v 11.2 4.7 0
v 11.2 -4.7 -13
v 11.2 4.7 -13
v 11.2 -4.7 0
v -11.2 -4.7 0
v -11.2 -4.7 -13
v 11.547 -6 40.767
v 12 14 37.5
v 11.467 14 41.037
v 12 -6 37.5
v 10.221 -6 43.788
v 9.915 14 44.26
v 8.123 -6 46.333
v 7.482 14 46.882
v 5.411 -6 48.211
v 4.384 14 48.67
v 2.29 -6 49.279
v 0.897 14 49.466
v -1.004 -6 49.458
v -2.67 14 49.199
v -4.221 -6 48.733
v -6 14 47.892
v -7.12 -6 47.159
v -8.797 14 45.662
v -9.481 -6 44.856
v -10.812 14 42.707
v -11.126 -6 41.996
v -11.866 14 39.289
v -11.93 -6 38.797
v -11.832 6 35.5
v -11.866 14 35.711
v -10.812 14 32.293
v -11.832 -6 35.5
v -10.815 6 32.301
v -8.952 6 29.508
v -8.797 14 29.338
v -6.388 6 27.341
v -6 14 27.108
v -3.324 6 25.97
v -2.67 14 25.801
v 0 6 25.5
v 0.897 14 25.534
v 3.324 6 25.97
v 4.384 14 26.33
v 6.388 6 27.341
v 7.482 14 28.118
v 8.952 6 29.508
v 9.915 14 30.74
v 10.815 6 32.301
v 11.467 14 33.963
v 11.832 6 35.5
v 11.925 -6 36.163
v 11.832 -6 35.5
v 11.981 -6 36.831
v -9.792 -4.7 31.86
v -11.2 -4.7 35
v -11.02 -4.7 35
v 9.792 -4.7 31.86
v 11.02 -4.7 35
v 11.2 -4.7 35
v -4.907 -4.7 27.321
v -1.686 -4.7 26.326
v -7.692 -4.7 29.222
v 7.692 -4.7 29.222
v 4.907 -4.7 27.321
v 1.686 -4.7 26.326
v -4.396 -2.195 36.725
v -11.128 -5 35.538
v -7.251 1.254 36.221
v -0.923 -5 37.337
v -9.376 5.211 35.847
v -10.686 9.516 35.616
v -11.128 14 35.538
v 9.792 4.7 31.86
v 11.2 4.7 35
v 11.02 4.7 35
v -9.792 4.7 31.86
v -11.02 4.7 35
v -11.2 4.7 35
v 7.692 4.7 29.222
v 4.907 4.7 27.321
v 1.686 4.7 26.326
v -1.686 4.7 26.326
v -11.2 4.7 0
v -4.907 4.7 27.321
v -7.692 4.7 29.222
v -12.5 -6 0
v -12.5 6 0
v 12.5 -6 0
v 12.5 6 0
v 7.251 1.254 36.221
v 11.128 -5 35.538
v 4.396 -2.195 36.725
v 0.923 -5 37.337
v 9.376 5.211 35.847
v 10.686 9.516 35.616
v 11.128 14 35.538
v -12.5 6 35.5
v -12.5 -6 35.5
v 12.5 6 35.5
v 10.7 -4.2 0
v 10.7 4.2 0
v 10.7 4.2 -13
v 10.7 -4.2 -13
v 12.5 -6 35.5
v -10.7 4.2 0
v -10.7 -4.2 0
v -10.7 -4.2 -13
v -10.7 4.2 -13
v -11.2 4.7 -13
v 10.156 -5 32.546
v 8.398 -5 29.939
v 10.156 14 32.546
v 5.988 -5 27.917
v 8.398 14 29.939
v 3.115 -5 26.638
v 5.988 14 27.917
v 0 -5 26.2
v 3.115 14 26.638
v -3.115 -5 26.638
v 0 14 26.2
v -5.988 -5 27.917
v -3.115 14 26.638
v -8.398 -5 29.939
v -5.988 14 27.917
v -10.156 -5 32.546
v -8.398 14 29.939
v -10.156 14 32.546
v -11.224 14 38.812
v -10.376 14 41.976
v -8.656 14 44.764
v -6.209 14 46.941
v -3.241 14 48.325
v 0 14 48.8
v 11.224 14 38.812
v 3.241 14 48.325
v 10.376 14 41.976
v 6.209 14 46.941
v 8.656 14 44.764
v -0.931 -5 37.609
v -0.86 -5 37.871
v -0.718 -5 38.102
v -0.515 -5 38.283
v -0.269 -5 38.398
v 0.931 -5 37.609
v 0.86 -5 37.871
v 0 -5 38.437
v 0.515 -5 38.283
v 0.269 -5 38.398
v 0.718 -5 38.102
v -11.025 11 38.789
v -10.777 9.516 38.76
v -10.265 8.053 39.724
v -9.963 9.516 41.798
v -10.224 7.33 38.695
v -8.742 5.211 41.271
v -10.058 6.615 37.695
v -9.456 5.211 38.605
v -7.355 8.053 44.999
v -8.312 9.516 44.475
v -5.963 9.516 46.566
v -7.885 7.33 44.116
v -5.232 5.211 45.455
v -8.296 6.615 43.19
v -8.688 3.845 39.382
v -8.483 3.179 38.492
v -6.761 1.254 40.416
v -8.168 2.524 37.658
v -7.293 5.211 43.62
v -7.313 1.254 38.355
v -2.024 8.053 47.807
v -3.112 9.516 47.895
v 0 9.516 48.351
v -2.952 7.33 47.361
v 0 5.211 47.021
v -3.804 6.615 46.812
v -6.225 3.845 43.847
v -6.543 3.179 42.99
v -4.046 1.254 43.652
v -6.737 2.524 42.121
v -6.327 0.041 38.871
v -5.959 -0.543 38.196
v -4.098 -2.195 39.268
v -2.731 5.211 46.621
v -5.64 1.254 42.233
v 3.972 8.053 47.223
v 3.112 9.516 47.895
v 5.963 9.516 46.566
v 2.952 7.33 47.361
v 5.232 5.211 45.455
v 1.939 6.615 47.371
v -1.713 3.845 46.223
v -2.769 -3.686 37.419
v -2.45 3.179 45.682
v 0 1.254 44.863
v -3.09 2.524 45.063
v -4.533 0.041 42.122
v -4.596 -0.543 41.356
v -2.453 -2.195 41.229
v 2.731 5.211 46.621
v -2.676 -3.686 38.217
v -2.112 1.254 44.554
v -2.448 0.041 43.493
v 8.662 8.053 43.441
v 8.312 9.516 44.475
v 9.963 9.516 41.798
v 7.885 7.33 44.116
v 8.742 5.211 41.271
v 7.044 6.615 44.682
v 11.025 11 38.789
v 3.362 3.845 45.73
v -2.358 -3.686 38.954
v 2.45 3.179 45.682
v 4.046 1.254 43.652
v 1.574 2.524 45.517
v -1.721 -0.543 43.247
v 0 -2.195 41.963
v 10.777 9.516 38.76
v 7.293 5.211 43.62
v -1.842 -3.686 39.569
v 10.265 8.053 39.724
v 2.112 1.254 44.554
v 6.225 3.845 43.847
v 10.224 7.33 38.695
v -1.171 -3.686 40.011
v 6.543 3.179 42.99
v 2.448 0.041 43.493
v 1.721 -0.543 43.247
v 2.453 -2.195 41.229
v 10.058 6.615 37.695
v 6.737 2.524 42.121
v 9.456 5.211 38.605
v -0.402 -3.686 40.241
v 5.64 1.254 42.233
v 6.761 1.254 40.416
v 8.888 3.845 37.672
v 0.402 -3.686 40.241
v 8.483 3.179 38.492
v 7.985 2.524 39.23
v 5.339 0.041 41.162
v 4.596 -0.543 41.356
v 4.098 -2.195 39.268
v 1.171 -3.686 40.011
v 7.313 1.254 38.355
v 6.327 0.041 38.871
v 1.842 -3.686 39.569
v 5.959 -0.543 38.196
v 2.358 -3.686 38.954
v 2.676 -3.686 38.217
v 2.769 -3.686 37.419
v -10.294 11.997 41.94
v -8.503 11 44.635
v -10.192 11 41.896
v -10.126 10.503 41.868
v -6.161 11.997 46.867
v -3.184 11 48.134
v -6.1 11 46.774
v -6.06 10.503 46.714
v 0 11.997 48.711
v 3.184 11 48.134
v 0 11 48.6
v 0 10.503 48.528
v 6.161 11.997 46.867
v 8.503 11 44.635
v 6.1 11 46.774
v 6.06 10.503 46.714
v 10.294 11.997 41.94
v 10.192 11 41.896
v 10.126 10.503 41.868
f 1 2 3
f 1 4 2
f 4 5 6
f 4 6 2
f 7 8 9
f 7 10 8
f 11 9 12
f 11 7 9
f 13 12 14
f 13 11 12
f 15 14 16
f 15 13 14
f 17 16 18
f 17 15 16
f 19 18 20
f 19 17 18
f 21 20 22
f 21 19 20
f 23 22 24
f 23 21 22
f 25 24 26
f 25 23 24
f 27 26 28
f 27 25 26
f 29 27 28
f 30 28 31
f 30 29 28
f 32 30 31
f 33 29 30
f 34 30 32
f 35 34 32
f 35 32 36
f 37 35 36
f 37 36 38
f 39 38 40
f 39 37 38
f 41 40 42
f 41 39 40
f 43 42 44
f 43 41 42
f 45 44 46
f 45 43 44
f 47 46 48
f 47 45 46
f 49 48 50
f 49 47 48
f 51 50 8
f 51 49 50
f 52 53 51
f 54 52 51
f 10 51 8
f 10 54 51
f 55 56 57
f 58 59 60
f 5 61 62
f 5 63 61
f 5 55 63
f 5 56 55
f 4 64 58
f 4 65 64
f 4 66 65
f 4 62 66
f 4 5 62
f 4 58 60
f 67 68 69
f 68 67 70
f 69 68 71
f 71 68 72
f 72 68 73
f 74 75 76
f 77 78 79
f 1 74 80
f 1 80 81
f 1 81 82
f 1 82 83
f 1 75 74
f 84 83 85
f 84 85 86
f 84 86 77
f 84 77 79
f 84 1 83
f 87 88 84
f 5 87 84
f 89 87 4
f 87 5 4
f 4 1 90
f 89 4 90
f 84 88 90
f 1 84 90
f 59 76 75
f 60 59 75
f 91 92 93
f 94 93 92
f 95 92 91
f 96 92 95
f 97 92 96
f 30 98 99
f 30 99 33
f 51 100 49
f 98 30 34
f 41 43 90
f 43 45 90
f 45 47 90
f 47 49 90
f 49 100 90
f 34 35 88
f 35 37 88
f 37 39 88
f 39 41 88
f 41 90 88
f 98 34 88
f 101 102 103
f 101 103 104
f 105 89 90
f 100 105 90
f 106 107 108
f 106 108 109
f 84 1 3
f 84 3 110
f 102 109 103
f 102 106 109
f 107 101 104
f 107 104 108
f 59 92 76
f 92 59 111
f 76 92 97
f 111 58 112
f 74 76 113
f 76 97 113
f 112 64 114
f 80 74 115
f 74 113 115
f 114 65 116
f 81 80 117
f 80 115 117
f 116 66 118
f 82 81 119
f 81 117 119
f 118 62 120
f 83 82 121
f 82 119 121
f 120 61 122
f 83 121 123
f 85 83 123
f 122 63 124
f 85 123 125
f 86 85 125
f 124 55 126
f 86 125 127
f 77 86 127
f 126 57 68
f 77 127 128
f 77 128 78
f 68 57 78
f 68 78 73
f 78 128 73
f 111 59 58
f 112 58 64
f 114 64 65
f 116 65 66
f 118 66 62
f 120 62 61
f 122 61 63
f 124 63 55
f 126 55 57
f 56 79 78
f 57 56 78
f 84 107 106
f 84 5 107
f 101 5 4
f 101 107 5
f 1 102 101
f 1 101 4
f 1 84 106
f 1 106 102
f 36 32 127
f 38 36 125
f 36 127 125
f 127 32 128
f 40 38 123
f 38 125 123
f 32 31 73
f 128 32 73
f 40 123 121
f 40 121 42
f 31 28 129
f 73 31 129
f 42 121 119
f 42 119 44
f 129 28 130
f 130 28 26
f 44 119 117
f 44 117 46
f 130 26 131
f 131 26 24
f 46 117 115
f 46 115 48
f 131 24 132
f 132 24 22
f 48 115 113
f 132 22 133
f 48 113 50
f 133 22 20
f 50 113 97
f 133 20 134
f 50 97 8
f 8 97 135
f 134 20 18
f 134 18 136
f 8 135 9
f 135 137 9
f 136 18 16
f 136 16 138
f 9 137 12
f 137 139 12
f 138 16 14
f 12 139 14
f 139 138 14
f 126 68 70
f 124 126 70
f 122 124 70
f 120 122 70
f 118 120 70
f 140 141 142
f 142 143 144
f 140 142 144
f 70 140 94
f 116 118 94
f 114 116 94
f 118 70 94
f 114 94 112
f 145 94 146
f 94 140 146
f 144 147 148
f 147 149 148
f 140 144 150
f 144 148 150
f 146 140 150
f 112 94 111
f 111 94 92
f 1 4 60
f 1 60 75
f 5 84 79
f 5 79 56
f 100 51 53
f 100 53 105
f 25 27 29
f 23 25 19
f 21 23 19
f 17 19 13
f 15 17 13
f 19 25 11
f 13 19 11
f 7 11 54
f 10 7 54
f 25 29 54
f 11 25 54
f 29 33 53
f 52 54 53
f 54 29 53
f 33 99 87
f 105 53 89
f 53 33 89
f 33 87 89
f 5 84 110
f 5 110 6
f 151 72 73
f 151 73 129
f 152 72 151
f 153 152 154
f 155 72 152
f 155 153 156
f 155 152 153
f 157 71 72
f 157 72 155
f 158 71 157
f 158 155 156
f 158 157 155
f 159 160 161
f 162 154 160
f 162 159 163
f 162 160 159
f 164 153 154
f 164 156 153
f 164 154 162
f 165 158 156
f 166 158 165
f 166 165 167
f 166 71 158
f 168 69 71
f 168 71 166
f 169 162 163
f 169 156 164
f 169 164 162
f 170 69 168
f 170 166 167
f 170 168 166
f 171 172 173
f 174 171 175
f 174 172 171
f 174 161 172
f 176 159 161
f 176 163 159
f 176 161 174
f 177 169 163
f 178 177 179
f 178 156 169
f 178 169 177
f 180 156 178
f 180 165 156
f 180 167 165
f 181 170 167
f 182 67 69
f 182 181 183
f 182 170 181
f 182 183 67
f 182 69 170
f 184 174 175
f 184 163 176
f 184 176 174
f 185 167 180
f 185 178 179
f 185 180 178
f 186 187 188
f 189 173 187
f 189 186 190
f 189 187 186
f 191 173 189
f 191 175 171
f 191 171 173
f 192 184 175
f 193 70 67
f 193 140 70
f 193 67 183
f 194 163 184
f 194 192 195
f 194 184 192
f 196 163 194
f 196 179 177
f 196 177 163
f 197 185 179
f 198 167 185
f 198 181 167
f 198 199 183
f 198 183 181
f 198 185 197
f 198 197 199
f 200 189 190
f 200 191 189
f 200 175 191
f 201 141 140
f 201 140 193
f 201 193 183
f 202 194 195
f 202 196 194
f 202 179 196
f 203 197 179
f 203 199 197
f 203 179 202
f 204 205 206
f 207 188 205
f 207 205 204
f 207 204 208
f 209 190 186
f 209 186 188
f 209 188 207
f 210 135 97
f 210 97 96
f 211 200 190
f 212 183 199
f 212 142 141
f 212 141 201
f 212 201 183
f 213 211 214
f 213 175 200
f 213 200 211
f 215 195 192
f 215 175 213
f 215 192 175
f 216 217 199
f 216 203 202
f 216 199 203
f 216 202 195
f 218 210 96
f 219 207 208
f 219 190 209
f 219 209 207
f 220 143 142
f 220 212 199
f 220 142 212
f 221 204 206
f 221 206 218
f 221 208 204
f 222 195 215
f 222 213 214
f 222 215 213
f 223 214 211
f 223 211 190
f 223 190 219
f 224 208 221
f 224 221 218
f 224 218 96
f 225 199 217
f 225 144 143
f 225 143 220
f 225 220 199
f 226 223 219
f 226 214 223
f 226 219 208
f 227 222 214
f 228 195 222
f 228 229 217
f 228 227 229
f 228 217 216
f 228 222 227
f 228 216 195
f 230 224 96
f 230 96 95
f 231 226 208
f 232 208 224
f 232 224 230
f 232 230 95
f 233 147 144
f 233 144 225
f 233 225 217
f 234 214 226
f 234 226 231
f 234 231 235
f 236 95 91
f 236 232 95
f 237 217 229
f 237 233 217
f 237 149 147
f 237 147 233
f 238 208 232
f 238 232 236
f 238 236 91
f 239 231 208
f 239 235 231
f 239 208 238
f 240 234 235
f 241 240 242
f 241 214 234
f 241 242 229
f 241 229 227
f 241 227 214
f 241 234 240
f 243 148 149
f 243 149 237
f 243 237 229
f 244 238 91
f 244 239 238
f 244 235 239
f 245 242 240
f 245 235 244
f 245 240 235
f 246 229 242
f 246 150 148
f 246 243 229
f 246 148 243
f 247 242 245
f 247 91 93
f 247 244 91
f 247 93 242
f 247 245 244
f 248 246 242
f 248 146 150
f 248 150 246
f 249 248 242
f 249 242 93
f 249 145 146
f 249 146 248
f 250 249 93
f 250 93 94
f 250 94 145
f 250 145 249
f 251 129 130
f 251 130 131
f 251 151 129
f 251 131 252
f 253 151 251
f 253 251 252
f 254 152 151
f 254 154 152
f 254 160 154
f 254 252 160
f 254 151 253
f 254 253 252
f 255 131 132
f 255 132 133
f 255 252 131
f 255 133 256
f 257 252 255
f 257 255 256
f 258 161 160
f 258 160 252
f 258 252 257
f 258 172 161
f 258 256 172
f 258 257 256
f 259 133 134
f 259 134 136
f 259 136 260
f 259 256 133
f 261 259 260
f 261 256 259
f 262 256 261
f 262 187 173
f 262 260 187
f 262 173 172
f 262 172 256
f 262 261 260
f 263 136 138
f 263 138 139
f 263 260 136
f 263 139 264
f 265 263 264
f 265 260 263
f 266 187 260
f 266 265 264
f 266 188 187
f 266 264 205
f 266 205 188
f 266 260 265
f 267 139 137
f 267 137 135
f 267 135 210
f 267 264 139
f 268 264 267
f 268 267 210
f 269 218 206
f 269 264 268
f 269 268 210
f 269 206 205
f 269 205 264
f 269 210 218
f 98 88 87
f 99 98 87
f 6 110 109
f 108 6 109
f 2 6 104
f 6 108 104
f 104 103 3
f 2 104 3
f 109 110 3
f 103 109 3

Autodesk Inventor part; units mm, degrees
ref_plane "YZ Plane" through (0, 0, 0) normal (1, 0, 0) x (0, 1, 0)
ref_plane "XZ Plane" through (0, 0, 0) normal (0, 1, 0) x (-1, 0, 0)
ref_plane "XY Plane" through (0, 0, 0) normal (0, 0, 1) x (1, 0, 0)
sketch "스케치1" plane through (0, 0, 0) normal (0, 0, 1) x (1, 0, 0)
  line L0 (-11.2, -4.7) -> (11.2, -4.7)
  line L1 (11.2, -4.7) -> (11.2, 4.7)
  line L2 (11.2, 4.7) -> (-11.2, 4.7)
  line L3 (-11.2, 4.7) -> (-11.2, -4.7)
  line L4 (-11.2, -4.7) -> (11.2, 4.7) construction
  line L5 (11.2, -4.7) -> (-11.2, 4.7) construction
  line L6 (-12.5, -6) -> (12.5, -6)
  line L7 (12.5, -6) -> (12.5, 6)
  line L8 (12.5, 6) -> (-12.5, 6)
  line L9 (-12.5, 6) -> (-12.5, -6)
  line L10 (-12.5, -6) -> (12.5, 6) construction
  line L11 (12.5, -6) -> (-12.5, 6) construction
  line L12 (-10.7, 4.2) -> (10.7, 4.2)
  line L13 (10.7, 4.2) -> (10.7, -4.2)
  line L14 (10.7, -4.2) -> (-10.7, -4.2)
  line L15 (-10.7, -4.2) -> (-10.7, 4.2)
  point P0 (0, 0)
  dimension "d0" = 22.4
  dimension "d1" = 9.4
  dimension "d2" = 25
  dimension "d3" = 12
  dimension "d6" = 0.5
extrude "돌출1" add sketch "스케치1" along normal blind 25.5 contours L9 L8 L7 L6
extrude "돌출2" add sketch "스케치1" against normal blind 13 contours L3 L2 L1 L0
sketch "스케치2" plane through (-12.5, -6, 0) normal (0, -1, 0) x (1, 0, 0)
  line L0 (0, 0) -> (25, 0) projected
  line L1 (0, 25.5) -> (25, 25.5) projected
  circle A0 centre (12.5, 37.5) radius 12
  circle A1 centre (12.5, 37.5) radius 11.3
  point P0 (12.5, 0)
  point P1 (12.5, 0)
  dimension "d9" = 24
  dimension "d11" = 0.7
extrude "돌출3" add sketch "스케치2" against normal blind 20 contours A0 | A1
sketch "스케치3" plane through (0, 0, 25.5) normal (0, 0, 1) x (1, 0, 0)
  line L0 (0, -6) -> (12.5, -6) projected
  line L1 (12.5, -6) -> (12.5, 6) projected
  line L2 (12.5, 6) -> (0, 6) projected
  line L3 (0, 4.7) -> (11.2, 4.7) projected
  line L4 (11.2, 4.7) -> (11.2, -4.7) projected
  line L5 (11.2, -4.7) -> (0, -4.7) projected
  line L6 (0, -6) -> (0, -4.7) projected
  line L7 (0, -4.7) -> (-11.2, -4.7) projected
  line L8 (-11.2, -4.7) -> (-11.2, 4.7) projected
  line L9 (-11.2, 4.7) -> (0, 4.7) projected
  line L10 (0, 4.7) -> (0, 6) projected
  line L11 (0, 6) -> (-12.5, 6) projected
  line L12 (-12.5, 6) -> (-12.5, -6) projected
  line L13 (-12.5, -6) -> (0, -6) projected
  line L14 (0, -6) -> (12.5, -6) projected
  line L15 (12.5, -6) -> (12.5, 6) projected
  line L16 (12.5, 6) -> (0, 6) projected
  line L17 (0, 4.7) -> (11.2, 4.7) projected
  line L18 (11.2, 4.7) -> (11.2, -4.7) projected
  line L19 (11.2, -4.7) -> (0, -4.7) projected
  point P0 (0, 0)
extrude "돌출4" add sketch "스케치3" along normal blind 10 contours L6 L5 L4 L3 L10 L2 L1 L0 | L13 L12 L11 L10 L9 L8 L7 L6
extrude "돌출5" cut sketch "스케치2" along normal blind 19 from surface at -20 contours A1
extrude "돌출6" cut sketch "스케치1" along normal blind 35 contours L3 L2 L1 L0 | L12 L13 L14 L15
ref_plane "작업 평면1" through (0, -6, 0) normal (1, 0, 0) x (0, 0, -1)
sketch "스케치4" plane through (0, -6, 0) normal (1, 0, 0) x (0, 0, -1)
  line L0 (-26.2, 20) -> (-26.2, 1) projected
  line L1 (-26.2, 20) -> (-26.2, 1) projected
  line L2 (0, 10.7) -> (-35, 10.7) projected
  line L3 (-48.8, 20) -> (-48.8, 1) projected
  line L4 (-26.2, 1) -> (-48.8, 1) projected
  line L5 (-26.2, 20) -> (-26.2, 1.2542)
  line L6 (-48.8, 20) -> (-26.2, 20)
  line L7 (-37.5, 1) -> (-37.5, 20)
  arc A0 (-48.8, 20) -> (-38.437, 0.9996) centre (-26.2, 20) ccw
  point P0 (0, 6)
  point P1 (-38.4376, 1)
revolve "회전1" add sketch "스케치4" angle 200 mid plane about axis through (0, -5, 37.5) along (0, 1, 0) contours L4 L3 A0
properties part number "Wire_aisle_v1" material "고무, 검은색"
